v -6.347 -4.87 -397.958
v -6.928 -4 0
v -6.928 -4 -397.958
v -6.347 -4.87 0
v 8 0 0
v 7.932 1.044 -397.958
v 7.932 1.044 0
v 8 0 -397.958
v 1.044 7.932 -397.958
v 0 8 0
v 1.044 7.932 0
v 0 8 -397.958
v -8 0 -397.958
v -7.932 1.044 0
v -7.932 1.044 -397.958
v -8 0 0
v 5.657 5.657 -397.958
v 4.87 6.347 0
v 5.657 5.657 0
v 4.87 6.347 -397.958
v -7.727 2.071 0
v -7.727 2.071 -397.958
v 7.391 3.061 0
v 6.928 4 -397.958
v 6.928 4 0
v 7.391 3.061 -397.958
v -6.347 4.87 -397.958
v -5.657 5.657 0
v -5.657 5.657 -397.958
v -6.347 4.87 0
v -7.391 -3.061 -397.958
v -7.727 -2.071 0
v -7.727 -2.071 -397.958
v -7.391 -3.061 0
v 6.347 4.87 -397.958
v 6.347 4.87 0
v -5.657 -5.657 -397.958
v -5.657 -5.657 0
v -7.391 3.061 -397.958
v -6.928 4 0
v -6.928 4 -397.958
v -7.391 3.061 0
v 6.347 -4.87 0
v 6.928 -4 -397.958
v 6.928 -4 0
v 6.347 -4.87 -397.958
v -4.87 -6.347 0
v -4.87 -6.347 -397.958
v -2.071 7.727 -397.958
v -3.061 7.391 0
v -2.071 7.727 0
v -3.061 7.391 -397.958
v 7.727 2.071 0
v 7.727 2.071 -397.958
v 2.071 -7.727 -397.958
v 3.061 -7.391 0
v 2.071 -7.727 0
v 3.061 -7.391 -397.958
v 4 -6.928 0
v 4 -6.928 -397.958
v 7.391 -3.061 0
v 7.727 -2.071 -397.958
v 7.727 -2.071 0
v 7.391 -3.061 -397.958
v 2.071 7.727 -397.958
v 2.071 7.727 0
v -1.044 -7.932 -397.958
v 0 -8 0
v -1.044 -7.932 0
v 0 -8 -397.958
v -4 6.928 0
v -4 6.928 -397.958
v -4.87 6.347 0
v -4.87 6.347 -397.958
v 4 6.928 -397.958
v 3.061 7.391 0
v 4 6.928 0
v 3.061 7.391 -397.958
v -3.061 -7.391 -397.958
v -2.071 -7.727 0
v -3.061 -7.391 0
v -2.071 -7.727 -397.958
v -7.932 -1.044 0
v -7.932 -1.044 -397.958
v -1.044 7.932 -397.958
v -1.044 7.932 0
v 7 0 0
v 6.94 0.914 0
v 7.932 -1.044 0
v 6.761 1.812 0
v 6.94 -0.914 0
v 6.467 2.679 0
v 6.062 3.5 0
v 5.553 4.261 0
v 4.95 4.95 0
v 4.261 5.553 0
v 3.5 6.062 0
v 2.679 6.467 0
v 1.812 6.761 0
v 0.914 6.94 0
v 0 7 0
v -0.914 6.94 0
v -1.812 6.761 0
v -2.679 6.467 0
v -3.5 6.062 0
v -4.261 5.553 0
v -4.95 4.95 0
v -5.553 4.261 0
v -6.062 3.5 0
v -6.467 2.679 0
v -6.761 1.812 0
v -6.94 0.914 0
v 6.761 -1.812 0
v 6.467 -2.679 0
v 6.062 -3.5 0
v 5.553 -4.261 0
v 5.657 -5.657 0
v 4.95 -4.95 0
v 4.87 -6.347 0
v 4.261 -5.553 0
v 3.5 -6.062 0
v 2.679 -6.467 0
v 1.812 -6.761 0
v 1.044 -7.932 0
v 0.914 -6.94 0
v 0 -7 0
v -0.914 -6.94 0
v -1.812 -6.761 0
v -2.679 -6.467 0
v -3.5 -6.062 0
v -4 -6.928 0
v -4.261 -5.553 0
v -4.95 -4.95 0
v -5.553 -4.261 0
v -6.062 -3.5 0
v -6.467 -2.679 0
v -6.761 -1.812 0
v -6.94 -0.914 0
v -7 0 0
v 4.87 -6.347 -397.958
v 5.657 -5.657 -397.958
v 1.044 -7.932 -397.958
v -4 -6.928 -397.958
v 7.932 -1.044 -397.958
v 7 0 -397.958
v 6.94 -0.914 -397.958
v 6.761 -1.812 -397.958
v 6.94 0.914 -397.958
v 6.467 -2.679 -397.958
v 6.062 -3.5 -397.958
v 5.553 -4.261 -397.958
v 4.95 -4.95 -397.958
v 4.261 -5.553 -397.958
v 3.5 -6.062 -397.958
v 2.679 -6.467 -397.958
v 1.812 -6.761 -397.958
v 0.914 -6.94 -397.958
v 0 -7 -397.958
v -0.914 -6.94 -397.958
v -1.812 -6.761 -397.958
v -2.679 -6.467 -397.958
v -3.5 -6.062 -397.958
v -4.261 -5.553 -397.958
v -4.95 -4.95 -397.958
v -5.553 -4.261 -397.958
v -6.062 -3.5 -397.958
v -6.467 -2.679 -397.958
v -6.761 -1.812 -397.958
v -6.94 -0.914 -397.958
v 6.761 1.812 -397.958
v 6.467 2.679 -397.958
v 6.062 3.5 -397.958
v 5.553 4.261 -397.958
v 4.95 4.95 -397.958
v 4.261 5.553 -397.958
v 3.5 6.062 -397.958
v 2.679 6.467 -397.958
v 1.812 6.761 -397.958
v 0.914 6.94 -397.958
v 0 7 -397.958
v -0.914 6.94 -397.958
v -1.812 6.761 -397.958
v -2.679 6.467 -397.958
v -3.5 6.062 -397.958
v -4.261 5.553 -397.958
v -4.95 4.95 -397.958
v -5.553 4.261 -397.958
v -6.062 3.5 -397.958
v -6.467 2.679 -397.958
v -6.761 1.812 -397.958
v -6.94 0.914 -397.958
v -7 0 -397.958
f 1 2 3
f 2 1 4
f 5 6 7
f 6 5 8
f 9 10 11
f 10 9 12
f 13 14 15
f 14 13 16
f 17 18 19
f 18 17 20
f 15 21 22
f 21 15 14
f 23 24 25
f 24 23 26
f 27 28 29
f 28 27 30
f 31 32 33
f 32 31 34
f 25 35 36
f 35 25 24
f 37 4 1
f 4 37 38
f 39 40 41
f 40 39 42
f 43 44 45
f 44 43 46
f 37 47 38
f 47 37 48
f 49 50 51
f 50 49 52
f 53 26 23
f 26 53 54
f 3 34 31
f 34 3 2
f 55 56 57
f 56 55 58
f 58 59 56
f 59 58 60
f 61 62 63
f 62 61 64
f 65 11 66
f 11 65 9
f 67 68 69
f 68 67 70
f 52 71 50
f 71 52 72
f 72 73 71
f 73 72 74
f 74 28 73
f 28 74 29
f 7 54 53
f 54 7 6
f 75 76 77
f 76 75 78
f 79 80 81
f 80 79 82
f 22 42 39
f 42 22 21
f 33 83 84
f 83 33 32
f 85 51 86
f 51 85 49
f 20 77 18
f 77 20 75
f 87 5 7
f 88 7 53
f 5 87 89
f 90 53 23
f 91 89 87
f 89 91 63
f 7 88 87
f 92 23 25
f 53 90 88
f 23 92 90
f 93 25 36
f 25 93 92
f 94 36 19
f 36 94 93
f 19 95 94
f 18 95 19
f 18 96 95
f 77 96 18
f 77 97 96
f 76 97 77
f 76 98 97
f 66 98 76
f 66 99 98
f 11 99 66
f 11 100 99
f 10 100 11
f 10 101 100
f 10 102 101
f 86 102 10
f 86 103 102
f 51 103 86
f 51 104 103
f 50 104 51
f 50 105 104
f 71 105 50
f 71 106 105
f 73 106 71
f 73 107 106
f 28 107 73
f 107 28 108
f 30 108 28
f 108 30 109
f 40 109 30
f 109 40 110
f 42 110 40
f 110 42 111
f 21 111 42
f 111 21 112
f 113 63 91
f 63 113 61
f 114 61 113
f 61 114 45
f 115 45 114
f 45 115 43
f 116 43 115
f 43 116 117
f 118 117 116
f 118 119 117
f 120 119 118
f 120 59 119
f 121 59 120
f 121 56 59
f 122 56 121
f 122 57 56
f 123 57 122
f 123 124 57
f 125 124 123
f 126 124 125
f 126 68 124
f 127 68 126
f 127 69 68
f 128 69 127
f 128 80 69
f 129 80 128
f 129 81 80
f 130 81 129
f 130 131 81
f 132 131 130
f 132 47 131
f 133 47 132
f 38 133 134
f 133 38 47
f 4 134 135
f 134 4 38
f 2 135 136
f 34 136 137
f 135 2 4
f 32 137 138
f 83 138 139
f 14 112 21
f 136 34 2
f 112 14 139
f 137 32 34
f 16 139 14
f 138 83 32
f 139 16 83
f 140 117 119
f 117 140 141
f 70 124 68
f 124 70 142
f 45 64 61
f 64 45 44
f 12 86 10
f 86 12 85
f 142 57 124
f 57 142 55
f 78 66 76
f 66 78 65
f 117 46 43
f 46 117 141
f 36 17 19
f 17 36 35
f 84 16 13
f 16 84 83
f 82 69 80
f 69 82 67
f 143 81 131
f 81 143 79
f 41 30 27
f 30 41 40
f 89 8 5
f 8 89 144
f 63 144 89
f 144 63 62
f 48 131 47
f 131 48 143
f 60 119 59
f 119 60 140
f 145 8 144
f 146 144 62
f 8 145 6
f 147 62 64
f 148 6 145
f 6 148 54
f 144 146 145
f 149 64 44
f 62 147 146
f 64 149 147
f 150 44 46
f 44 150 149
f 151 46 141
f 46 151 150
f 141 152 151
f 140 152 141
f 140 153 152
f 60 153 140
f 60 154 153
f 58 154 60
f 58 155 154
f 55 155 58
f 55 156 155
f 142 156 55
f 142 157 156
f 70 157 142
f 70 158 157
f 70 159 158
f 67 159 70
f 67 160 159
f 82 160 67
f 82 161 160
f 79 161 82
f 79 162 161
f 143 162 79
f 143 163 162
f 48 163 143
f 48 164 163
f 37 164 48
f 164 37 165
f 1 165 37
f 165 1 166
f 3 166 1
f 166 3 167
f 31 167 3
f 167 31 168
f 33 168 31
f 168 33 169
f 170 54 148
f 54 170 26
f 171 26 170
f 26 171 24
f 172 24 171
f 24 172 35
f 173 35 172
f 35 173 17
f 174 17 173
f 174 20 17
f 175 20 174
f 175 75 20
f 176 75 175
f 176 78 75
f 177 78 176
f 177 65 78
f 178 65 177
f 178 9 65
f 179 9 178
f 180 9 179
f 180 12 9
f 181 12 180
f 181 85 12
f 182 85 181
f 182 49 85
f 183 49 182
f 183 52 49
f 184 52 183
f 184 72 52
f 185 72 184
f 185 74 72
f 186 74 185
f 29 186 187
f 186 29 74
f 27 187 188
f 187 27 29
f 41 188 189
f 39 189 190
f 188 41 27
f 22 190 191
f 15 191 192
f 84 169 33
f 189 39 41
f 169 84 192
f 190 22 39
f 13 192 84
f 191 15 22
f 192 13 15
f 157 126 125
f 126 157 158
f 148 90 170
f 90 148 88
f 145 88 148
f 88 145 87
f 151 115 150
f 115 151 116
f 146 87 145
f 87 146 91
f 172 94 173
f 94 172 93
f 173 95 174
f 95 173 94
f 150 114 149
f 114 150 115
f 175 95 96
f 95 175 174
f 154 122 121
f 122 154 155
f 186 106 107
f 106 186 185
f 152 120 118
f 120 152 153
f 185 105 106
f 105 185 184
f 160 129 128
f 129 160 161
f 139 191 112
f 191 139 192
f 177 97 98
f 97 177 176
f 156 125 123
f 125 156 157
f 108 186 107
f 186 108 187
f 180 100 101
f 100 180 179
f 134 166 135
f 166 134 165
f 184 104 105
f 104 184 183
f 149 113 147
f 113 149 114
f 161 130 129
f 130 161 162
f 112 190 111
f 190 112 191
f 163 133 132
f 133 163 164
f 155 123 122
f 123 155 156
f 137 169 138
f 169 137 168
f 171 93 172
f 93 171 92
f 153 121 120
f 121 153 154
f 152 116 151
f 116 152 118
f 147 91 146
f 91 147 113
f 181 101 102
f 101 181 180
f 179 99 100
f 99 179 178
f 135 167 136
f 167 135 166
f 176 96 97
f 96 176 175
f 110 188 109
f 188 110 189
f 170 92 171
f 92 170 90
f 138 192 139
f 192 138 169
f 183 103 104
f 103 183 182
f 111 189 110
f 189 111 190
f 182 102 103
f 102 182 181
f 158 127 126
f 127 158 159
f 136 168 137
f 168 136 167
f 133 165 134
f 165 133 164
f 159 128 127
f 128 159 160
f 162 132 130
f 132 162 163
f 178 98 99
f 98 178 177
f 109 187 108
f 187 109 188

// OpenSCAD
// file: ../common/ds_lib.scad
// DronSwarm · librería común de piezas del frame (S07-S08). Unidades: mm.
//
// Reglas (ADR-003): sin hull()/minkowski()/offset() — FreeCAD los convierte en malla y el STEP deja de ser un
// sólido válido. Las formas redondeadas se arman con uniones de cubos y cilindros. El importador CSG de FreeCAD
// también falla con booleanas 2D y con varios operandos agrupados bajo una sola transformación: cada grupo de
// agujeros debe ser hijo directo del difference(), con su propio translate.
//
// Interfaz de motor DronSwarm (DMI, ADR-011): placa con 4 ranuras radiales a 90°, de modo que el mismo soporte
// acepta varios patrones comerciales y, más adelante, el motor propio (S17+) se diseña para caer en el mismo rango.
//   DMI-S: 4×M3, círculo de tornillos Ø16-Ø25 (motores 28xx-41xx, ≤ 600 W)
//   DMI-L: 4×M4, círculo de tornillos Ø30-Ø42 (motores 50xx-70xx, ≤ 2 kW)

$fn = 48;

M3 = 3.3; M3_HEAD = 6.0; M3_NUT = 6.4;     // pasante, cabeza, tuerca (entre caras + juego)
M4 = 4.4; M4_HEAD = 7.5;
M5 = 5.4;

function dmi_bolt(iface) = iface == "L" ? M4 : M3;
function dmi_r(iface) = iface == "L" ? [15, 21] : [8, 12.5];   // radio mínimo y máximo de las ranuras
function dmi_plate_d(iface) = iface == "L" ? 56 : 36;
function dmi_center(iface) = iface == "L" ? 16 : 10;            // eje, seguro y paso de cables

// Rectángulo con esquinas redondeadas (2D) y su extrusión
module rrect2d(size, r) {
    r2 = min(r, size[0] / 2 - 0.01, size[1] / 2 - 0.01);
    union() {
        translate([r2, 0]) square([size[0] - 2 * r2, size[1]]);
        translate([0, r2]) square([size[0], size[1] - 2 * r2]);
        for (x = [r2, size[0] - r2], y = [r2, size[1] - r2]) translate([x, y]) circle(r = r2);
    }
}
// Caja redondeada con primitivas 3D (sin booleanas 2D: el importador CSG de FreeCAD falla con ellas)
module rbox(size, r) {
    r2 = min(r, size[0] / 2 - 0.01, size[1] / 2 - 0.01);
    union() {
        translate([r2, 0, 0]) cube([size[0] - 2 * r2, size[1], size[2]]);
        translate([0, r2, 0]) cube([size[0], size[1] - 2 * r2, size[2]]);
        for (x = [r2, size[0] - r2], y = [r2, size[1] - r2]) translate([x, y, 0]) cylinder(r = r2, h = size[2]);
    }
}
module crbox(size, r) { translate([-size[0] / 2, -size[1] / 2, 0]) rbox(size, r); }   // centrado en x/y

// Ranura (2D) entre dos puntos sobre el eje x
module slot2d(r0, r1, w) {
    union() {
        translate([r0, -w / 2]) square([r1 - r0, w]);
        translate([r0, 0]) circle(d = w);
        translate([r1, 0]) circle(d = w);
    }
}

// Agujeros de la interfaz de motor (para restar de una placa de espesor t)
module slot3d(r0, r1, w, h) {
    union() {
        translate([r0, -w / 2, 0]) cube([r1 - r0, w, h]);
        translate([r0, 0, 0]) cylinder(d = w, h = h);
        translate([r1, 0, 0]) cylinder(d = w, h = h);
    }
}
module dmi_holes(iface, t) {
    r = dmi_r(iface);
    translate([0, 0, -1]) union() {
        cylinder(d = dmi_center(iface), h = t + 2);
        for (a = [45, 135, 225, 315]) rotate(a) slot3d(r[0], r[1], dmi_bolt(iface), t + 2);
    }
}

// Soporte de motor en la punta del brazo: manguito sobre el tubo + placa DMI arriba
//   el tubo entra por -x; la placa queda centrada en el eje del motor (origen), cara superior en z = 0
module motor_mount(tube_d, iface = "S", sleeve = 34, wall = 3.5) {
    od = tube_d + 2 * wall;
    pd = dmi_plate_d(iface);
    pt = iface == "L" ? 6 : 4;
    zc = -pt - tube_d / 2 - 1;                 // eje del tubo bajo la placa
    difference() {
        union() {
            translate([0, 0, -pt]) cylinder(d = pd, h = pt);                         // placa DMI
            translate([-sleeve - pd / 2 + 6, 0, zc]) rotate([0, 90, 0])
                cylinder(d = od, h = sleeve + pd / 2 - 6 + 4);                       // manguito
            translate([-sleeve - pd / 2 + 6, -od / 2, zc]) cube([sleeve + pd / 2 - 2, od, -zc - pt + 0.01]);  // alma
            translate([-sleeve - pd / 2 + 6, -5, zc - od / 2 - 7]) cube([sleeve, 10, 8]);   // oreja de apriete
        }
        dmi_holes(iface, pt + 0.02, $fn = 32);
        translate([-sleeve - pd / 2 + 5, 0, zc]) rotate([0, 90, 0]) cylinder(d = tube_d + 0.3, h = sleeve + pd / 2 - 3); // tubo
        translate([-sleeve - pd / 2 + 4, -1, zc - od / 2 - 8]) cube([sleeve + 1, 2, od / 2 + 6]);   // ranura de apriete
        for (x = [0.3, 0.75]) translate([-sleeve - pd / 2 + 6 + x * sleeve, 0, zc - od / 2 - 3])
            rotate([90, 0, 0]) cylinder(d = M3, h = 30, center = true);                // tornillos de apriete
        translate([-pd / 2 - 2, 0, zc]) rotate([0, 90, 0]) cylinder(d = 7, h = pd);   // salida de cables del tubo
    }
}

// Bloque de brazo entre las dos placas centrales (impreso PA12-CF): sujeta el tubo y separa las placas.
//   el tubo sale por +x desde el origen; el bloque ocupa x ∈ [-len, 0], altura = gap
module arm_block(tube_d, gap, len = 40, width = 0, bolt = M3) {
    w = width > 0 ? width : tube_d + 14;
    difference() {
        translate([-len, -w / 2, 0]) rbox([len, w, gap], 2);
        translate([-len - 1, 0, gap / 2]) rotate([0, 90, 0]) cylinder(d = tube_d + 0.2, h = len + 2);   // tubo
        translate([-len - 1, -0.75, gap / 2]) cube([len + 2, 1.5, gap / 2 + 1]);                        // ranura de apriete
        for (p = arm_block_bolts(tube_d, len, w)) translate([p[0], p[1], -1]) cylinder(d = bolt, h = gap + 2);
        translate([-len * 0.5, 0, gap * 0.78]) rotate([90, 0, 0]) cylinder(d = M3, h = w + 2, center = true);  // apriete
    }
}
function arm_block_bolts(tube_d, len, w) =
    [for (x = [-len + 6, -6], y = [-(w / 2 - 3.6), w / 2 - 3.6]) [x, y]];

// Patrón de controladora de vuelo (agujeros M3 en cuadrado)
module fc_holes(pattern, t) {
    for (x = [-1, 1], y = [-1, 1]) translate([x * pattern / 2, y * pattern / 2, -1]) cylinder(d = M3, h = t + 2);
}
// file: ds_d_params.scad
// DS-D · parámetros generados por tools/cad/gen_cad_params.py el 2026-10-19
// desde engineering/data/results (spec v1). No editar a mano: regenerar. Unidades: mm, kg.

vehicle = "DS-D";
rotors = 6;
wheelbase = 1453;
arm_radius = 726.5;
prop_d = 660.4;
tube_od = 22;
tube_wall = 1.5;
arm_len = 545;
plate_d = 363.2;
plate_t = 3;
plate_gap = 28;
motor_iface = "L";
battery_dims = [220, 134.4, 76.2];
battery = "12S5P P42A";
leg_h = 420;
fold_arms = true;
mtow_kg = 15.61;
motor_mass_kg = 0.345;
fc_pattern = 30.5;
payload_box = [300, 240, 220];
payload_kg = 5;
// file: ds_d_frame.scad
// DS-D · geometría compartida del frame: posiciones derivadas de los parámetros (spec v1). Unidades: mm.
// Ejes: x adelante, y izquierda, z arriba. z = 0 es la cara superior de la placa inferior.
// Hexa con brazos desmontables (bloques con levas entre las placas, ADR-012), batería y carcasa arriba,
// mecanismo de liberación de la carga al centro abajo, tren de esquíes.

include <ds_d_params.scad>
use <../common/ds_lib.scad>
include <../common/ds_lib.scad>

arm_angles = [0, 60, 120, 180, 240, 300];      // igual que el SDF/PX4 (rotor 0 adelante)
// Brazos desmontables (ADR-012): el tubo entra en un bloque impreso entre las placas y se fija con 2 levas de
// apriete rápido; los cables del motor tienen un conector en el bloque. Se monta/desmonta sin herramientas.
block_len = 60;
block_w = tube_od + 20;
r_block_out = plate_d / 2 - 3;                  // cara exterior del bloque
tube_insert = 54;                               // el tubo entra hasta un tope interior
tube_z = plate_gap / 2;
tube_start = r_block_out - tube_insert;
tube_len = arm_radius - tube_start - 6;
mm_sleeve = 30;

// Arriba: batería transversal atrás y carcasa adelante. Abajo: liberación al centro, FPV adelante
battery_pos = [-60, 0];
housing_size = [130, 110, 62];
housing_pos = [90, 0];
housing_flange = 10;
housing_bolts = [for (x = [-1, 0, 1], y = [-1, 1]) [housing_pos[0] + x * (housing_size[0] / 2 + 6), y * (housing_size[1] / 2 + 6)]];   // fuera del canal de la junta
battery_tray_bolts = [for (x = [-1, 1], y = [-1, 1]) [battery_pos[0] + x * 50, y * 95]];
release_bolts = [for (x = [-1, 1], y = [-1, 1]) [x * 35, y * 20]];
cable_gland_pos = [housing_pos[0] - housing_size[0] / 2 + 20, 0];
fpv_pos = [plate_d / 2 - 30, 0];

// Tren de esquíes: 4 patas inclinadas desde la placa inferior hasta dos esquíes longitudinales (base ancha)
leg_x = 100;                                    // patas en x = ±leg_x
leg_y_top = 110;                                // arriba, bajo la placa
skid_y = 220;                                   // esquíes en y = ±skid_y
skid_len = 560;
gear_tube = 16;                                 // tubos Ø16×1
gear_wall = 1.0;
ground_z = -leg_h;
skid_z = ground_z + gear_tube / 2 + 6;          // eje del esquí (sobre su zapata de TPU de 6 mm)
gear_mount_h = 30;                              // soporte impreso bajo la placa
// pivotes: el del soporte (bajo la placa) y el de la T (eje del esquí); la pata va de uno a otro
pivot_top = [leg_y_top, -plate_t - 6];
pivot_bot = [skid_y, skid_z];
leg_dy = pivot_bot[0] - pivot_top[0];
leg_dz = pivot_top[1] - pivot_bot[1];
leg_tilt = atan(leg_dy / leg_dz);               // inclinación hacia afuera (en torno a x)
leg_in_top = 4;                                 // el tubo termina 4 mm antes del pivote del soporte
leg_in_bot = 10;                                // y 10 mm después del eje del esquí
leg_len = sqrt(leg_dy * leg_dy + leg_dz * leg_dz) - leg_in_top - leg_in_bot;
gear_mount_bolts = [for (sx = [-1, 1], sy = [-1, 1], d = [[-14, -10], [14, -10], [-14, 10], [14, 10]]) [sx * leg_x + d[0], sy * leg_y_top + d[1]]];

motor_d = motor_iface == "L" ? 62 : 38;
motor_h = motor_iface == "L" ? 36 : 26;
function block_bolts() = [for (x = [-block_len + 7, -block_len / 2, -7], y = [-1, 1]) [x, y * (block_w / 2 - 4.5)]];
// main file
// DS-D · pata del tren: tubo de carbono Ø16×1.5 (×4). Local: eje z, desde z = 0 hacia abajo.
include <ds_d_frame.scad>
module leg_tube() translate([0, 0, -leg_len]) difference() {
    cylinder(d = gear_tube, h = leg_len, $fn = 48);
    translate([0, 0, -1]) cylinder(d = gear_tube - 2 * gear_wall, h = leg_len + 2, $fn = 48);
}
leg_tube();
